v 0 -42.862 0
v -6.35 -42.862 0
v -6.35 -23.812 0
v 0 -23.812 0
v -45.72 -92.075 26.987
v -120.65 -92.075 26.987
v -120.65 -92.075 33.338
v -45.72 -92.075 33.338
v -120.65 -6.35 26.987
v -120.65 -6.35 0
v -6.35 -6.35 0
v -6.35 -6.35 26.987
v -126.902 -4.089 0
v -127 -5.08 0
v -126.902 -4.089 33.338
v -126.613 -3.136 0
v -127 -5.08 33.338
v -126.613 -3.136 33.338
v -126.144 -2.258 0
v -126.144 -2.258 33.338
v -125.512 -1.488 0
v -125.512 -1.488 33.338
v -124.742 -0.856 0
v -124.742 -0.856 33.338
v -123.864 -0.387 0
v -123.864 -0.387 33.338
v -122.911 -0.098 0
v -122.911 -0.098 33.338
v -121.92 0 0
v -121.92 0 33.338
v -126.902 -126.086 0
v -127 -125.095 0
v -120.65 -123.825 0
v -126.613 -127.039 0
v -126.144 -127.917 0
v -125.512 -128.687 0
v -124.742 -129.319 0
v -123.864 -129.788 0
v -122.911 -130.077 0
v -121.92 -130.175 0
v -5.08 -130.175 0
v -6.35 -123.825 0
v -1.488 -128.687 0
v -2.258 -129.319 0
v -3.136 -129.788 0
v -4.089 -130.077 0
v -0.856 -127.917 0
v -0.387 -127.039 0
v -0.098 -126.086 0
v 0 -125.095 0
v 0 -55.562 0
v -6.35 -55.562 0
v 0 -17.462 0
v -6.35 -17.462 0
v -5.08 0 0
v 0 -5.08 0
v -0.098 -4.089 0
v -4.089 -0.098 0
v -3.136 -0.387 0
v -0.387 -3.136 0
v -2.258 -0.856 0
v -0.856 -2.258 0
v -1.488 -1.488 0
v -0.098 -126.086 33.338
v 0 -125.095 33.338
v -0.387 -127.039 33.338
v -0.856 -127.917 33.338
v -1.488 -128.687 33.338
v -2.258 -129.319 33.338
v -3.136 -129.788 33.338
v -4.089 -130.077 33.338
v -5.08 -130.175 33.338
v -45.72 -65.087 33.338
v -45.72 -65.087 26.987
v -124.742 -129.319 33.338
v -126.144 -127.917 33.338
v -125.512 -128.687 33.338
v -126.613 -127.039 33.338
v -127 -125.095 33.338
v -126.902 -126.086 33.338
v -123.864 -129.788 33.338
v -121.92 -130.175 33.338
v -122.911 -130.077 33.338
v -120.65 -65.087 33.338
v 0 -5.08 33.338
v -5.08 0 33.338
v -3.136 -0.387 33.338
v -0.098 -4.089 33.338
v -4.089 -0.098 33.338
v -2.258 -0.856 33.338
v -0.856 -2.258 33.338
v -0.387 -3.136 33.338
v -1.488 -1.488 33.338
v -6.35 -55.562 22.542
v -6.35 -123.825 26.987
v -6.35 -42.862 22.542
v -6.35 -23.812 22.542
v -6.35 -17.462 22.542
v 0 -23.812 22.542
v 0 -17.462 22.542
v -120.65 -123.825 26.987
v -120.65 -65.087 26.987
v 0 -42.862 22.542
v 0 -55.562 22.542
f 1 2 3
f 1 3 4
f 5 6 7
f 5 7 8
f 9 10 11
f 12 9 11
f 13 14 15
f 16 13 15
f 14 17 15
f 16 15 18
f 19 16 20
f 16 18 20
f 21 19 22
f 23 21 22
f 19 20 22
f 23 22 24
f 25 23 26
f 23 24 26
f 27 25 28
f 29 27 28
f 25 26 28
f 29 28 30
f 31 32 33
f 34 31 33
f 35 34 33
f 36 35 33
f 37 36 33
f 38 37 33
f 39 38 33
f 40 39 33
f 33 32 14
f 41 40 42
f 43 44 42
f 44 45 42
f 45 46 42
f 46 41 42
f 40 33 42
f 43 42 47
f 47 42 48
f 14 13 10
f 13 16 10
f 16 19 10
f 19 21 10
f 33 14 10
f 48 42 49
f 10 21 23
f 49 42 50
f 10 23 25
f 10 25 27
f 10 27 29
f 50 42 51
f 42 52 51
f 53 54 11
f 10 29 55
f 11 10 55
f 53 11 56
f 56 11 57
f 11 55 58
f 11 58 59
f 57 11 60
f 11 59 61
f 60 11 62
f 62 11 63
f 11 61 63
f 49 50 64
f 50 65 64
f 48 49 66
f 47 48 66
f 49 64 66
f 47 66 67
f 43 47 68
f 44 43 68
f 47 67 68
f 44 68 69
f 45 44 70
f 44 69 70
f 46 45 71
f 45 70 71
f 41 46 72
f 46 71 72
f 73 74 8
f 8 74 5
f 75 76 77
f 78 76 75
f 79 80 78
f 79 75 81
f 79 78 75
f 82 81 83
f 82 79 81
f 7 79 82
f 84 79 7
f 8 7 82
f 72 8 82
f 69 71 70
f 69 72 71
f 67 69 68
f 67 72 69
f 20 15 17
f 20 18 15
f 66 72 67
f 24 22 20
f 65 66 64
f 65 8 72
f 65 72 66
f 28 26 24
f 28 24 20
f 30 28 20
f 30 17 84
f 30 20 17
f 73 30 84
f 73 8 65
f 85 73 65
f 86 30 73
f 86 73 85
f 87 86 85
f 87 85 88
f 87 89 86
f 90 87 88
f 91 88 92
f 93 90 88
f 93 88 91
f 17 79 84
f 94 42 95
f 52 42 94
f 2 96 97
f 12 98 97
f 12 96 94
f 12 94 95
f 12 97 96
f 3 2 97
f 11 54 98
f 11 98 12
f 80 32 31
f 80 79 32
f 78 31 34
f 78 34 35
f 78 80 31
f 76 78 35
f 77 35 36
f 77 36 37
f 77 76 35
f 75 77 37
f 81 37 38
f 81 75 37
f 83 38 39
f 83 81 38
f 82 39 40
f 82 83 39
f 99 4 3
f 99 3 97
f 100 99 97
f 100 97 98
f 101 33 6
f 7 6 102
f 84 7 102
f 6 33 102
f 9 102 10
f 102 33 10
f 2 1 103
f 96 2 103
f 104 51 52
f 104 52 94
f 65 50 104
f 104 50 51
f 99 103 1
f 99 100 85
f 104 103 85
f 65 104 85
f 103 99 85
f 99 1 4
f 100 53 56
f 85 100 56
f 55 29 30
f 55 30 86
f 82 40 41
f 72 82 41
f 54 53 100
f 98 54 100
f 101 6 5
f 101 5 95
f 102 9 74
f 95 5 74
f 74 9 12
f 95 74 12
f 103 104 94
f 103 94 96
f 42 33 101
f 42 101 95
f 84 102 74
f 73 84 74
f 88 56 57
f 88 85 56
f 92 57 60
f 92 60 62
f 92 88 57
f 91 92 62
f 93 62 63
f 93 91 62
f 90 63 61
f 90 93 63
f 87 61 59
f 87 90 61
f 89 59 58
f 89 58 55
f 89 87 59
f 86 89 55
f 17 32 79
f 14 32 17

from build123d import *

# Parameters (mm, degrees)
F0_W     = 127
F0_H     = 130.175
F1_DEPTH = 33.3375
F2_T     = -6.35
F3_W     = 74.93
F3_H     = 26.9875
F4_DEPTH = 35.052
F5_W     = 12.7
F5_H     = 8.6501294995
F5_W_2   = 6.35
F6_DEPTH = 25.4
F7_R     = 5.08
F5_H_2   = 22.5425
F8_DEPTH = 25.4


with BuildPart() as f1:
    # F0 (on Top) → F1 (new body)
    with BuildSketch(Plane.XY):
        with Locations((-63.5, -65.0875)):
            Rectangle(F0_W, F0_H)
    extrude(amount=F1_DEPTH)

    # F2
    f2_openings = [f1.faces().sort_by_distance(p)[0] for p in [
        (-63.5, -65.0875, 0),
    ]]
    offset(amount=F2_T, openings=f2_openings)

    # F3 (on face) → F4 (cut)
    with BuildSketch(Plane(origin=(0, 0, 0), x_dir=(1, 0, 0), z_dir=(0, 0, -1))):
        with Locations((-83.185, 78.58125)):
            Rectangle(F3_W, F3_H)
    extrude(amount=-F4_DEPTH, mode=Mode.SUBTRACT)

    # F5 (on face) → F6 (cut)
    with BuildSketch(Plane.YZ):
        with Locations((-49.2125, -4.3250647498)):
            Rectangle(F5_W, F5_H)
        with Locations((-20.6375, -4.3250647498)):
            Rectangle(F5_W_2, F5_H)
    extrude(amount=-F6_DEPTH, mode=Mode.SUBTRACT)

    # F7
    f7_edges = [f1.edges().sort_by_distance(p)[0] for p in [
        (-127, 0, 16.66875),
        (-127, -130.175, 16.66875),
        (0, -130.175, 16.66875),
        (0, 0, 16.66875),
    ]]
    fillet(f7_edges, radius=F7_R)

    # F5 (on face) → F8 (cut)
    with BuildSketch(Plane.YZ):
        with Locations((-49.2125, 11.27125)):
            Rectangle(F5_W, F5_H_2)
        with Locations((-20.6375, 11.27125)):
            Rectangle(F5_W_2, F5_H_2)
    extrude(amount=-F8_DEPTH, mode=Mode.SUBTRACT)


solid = f1.part
